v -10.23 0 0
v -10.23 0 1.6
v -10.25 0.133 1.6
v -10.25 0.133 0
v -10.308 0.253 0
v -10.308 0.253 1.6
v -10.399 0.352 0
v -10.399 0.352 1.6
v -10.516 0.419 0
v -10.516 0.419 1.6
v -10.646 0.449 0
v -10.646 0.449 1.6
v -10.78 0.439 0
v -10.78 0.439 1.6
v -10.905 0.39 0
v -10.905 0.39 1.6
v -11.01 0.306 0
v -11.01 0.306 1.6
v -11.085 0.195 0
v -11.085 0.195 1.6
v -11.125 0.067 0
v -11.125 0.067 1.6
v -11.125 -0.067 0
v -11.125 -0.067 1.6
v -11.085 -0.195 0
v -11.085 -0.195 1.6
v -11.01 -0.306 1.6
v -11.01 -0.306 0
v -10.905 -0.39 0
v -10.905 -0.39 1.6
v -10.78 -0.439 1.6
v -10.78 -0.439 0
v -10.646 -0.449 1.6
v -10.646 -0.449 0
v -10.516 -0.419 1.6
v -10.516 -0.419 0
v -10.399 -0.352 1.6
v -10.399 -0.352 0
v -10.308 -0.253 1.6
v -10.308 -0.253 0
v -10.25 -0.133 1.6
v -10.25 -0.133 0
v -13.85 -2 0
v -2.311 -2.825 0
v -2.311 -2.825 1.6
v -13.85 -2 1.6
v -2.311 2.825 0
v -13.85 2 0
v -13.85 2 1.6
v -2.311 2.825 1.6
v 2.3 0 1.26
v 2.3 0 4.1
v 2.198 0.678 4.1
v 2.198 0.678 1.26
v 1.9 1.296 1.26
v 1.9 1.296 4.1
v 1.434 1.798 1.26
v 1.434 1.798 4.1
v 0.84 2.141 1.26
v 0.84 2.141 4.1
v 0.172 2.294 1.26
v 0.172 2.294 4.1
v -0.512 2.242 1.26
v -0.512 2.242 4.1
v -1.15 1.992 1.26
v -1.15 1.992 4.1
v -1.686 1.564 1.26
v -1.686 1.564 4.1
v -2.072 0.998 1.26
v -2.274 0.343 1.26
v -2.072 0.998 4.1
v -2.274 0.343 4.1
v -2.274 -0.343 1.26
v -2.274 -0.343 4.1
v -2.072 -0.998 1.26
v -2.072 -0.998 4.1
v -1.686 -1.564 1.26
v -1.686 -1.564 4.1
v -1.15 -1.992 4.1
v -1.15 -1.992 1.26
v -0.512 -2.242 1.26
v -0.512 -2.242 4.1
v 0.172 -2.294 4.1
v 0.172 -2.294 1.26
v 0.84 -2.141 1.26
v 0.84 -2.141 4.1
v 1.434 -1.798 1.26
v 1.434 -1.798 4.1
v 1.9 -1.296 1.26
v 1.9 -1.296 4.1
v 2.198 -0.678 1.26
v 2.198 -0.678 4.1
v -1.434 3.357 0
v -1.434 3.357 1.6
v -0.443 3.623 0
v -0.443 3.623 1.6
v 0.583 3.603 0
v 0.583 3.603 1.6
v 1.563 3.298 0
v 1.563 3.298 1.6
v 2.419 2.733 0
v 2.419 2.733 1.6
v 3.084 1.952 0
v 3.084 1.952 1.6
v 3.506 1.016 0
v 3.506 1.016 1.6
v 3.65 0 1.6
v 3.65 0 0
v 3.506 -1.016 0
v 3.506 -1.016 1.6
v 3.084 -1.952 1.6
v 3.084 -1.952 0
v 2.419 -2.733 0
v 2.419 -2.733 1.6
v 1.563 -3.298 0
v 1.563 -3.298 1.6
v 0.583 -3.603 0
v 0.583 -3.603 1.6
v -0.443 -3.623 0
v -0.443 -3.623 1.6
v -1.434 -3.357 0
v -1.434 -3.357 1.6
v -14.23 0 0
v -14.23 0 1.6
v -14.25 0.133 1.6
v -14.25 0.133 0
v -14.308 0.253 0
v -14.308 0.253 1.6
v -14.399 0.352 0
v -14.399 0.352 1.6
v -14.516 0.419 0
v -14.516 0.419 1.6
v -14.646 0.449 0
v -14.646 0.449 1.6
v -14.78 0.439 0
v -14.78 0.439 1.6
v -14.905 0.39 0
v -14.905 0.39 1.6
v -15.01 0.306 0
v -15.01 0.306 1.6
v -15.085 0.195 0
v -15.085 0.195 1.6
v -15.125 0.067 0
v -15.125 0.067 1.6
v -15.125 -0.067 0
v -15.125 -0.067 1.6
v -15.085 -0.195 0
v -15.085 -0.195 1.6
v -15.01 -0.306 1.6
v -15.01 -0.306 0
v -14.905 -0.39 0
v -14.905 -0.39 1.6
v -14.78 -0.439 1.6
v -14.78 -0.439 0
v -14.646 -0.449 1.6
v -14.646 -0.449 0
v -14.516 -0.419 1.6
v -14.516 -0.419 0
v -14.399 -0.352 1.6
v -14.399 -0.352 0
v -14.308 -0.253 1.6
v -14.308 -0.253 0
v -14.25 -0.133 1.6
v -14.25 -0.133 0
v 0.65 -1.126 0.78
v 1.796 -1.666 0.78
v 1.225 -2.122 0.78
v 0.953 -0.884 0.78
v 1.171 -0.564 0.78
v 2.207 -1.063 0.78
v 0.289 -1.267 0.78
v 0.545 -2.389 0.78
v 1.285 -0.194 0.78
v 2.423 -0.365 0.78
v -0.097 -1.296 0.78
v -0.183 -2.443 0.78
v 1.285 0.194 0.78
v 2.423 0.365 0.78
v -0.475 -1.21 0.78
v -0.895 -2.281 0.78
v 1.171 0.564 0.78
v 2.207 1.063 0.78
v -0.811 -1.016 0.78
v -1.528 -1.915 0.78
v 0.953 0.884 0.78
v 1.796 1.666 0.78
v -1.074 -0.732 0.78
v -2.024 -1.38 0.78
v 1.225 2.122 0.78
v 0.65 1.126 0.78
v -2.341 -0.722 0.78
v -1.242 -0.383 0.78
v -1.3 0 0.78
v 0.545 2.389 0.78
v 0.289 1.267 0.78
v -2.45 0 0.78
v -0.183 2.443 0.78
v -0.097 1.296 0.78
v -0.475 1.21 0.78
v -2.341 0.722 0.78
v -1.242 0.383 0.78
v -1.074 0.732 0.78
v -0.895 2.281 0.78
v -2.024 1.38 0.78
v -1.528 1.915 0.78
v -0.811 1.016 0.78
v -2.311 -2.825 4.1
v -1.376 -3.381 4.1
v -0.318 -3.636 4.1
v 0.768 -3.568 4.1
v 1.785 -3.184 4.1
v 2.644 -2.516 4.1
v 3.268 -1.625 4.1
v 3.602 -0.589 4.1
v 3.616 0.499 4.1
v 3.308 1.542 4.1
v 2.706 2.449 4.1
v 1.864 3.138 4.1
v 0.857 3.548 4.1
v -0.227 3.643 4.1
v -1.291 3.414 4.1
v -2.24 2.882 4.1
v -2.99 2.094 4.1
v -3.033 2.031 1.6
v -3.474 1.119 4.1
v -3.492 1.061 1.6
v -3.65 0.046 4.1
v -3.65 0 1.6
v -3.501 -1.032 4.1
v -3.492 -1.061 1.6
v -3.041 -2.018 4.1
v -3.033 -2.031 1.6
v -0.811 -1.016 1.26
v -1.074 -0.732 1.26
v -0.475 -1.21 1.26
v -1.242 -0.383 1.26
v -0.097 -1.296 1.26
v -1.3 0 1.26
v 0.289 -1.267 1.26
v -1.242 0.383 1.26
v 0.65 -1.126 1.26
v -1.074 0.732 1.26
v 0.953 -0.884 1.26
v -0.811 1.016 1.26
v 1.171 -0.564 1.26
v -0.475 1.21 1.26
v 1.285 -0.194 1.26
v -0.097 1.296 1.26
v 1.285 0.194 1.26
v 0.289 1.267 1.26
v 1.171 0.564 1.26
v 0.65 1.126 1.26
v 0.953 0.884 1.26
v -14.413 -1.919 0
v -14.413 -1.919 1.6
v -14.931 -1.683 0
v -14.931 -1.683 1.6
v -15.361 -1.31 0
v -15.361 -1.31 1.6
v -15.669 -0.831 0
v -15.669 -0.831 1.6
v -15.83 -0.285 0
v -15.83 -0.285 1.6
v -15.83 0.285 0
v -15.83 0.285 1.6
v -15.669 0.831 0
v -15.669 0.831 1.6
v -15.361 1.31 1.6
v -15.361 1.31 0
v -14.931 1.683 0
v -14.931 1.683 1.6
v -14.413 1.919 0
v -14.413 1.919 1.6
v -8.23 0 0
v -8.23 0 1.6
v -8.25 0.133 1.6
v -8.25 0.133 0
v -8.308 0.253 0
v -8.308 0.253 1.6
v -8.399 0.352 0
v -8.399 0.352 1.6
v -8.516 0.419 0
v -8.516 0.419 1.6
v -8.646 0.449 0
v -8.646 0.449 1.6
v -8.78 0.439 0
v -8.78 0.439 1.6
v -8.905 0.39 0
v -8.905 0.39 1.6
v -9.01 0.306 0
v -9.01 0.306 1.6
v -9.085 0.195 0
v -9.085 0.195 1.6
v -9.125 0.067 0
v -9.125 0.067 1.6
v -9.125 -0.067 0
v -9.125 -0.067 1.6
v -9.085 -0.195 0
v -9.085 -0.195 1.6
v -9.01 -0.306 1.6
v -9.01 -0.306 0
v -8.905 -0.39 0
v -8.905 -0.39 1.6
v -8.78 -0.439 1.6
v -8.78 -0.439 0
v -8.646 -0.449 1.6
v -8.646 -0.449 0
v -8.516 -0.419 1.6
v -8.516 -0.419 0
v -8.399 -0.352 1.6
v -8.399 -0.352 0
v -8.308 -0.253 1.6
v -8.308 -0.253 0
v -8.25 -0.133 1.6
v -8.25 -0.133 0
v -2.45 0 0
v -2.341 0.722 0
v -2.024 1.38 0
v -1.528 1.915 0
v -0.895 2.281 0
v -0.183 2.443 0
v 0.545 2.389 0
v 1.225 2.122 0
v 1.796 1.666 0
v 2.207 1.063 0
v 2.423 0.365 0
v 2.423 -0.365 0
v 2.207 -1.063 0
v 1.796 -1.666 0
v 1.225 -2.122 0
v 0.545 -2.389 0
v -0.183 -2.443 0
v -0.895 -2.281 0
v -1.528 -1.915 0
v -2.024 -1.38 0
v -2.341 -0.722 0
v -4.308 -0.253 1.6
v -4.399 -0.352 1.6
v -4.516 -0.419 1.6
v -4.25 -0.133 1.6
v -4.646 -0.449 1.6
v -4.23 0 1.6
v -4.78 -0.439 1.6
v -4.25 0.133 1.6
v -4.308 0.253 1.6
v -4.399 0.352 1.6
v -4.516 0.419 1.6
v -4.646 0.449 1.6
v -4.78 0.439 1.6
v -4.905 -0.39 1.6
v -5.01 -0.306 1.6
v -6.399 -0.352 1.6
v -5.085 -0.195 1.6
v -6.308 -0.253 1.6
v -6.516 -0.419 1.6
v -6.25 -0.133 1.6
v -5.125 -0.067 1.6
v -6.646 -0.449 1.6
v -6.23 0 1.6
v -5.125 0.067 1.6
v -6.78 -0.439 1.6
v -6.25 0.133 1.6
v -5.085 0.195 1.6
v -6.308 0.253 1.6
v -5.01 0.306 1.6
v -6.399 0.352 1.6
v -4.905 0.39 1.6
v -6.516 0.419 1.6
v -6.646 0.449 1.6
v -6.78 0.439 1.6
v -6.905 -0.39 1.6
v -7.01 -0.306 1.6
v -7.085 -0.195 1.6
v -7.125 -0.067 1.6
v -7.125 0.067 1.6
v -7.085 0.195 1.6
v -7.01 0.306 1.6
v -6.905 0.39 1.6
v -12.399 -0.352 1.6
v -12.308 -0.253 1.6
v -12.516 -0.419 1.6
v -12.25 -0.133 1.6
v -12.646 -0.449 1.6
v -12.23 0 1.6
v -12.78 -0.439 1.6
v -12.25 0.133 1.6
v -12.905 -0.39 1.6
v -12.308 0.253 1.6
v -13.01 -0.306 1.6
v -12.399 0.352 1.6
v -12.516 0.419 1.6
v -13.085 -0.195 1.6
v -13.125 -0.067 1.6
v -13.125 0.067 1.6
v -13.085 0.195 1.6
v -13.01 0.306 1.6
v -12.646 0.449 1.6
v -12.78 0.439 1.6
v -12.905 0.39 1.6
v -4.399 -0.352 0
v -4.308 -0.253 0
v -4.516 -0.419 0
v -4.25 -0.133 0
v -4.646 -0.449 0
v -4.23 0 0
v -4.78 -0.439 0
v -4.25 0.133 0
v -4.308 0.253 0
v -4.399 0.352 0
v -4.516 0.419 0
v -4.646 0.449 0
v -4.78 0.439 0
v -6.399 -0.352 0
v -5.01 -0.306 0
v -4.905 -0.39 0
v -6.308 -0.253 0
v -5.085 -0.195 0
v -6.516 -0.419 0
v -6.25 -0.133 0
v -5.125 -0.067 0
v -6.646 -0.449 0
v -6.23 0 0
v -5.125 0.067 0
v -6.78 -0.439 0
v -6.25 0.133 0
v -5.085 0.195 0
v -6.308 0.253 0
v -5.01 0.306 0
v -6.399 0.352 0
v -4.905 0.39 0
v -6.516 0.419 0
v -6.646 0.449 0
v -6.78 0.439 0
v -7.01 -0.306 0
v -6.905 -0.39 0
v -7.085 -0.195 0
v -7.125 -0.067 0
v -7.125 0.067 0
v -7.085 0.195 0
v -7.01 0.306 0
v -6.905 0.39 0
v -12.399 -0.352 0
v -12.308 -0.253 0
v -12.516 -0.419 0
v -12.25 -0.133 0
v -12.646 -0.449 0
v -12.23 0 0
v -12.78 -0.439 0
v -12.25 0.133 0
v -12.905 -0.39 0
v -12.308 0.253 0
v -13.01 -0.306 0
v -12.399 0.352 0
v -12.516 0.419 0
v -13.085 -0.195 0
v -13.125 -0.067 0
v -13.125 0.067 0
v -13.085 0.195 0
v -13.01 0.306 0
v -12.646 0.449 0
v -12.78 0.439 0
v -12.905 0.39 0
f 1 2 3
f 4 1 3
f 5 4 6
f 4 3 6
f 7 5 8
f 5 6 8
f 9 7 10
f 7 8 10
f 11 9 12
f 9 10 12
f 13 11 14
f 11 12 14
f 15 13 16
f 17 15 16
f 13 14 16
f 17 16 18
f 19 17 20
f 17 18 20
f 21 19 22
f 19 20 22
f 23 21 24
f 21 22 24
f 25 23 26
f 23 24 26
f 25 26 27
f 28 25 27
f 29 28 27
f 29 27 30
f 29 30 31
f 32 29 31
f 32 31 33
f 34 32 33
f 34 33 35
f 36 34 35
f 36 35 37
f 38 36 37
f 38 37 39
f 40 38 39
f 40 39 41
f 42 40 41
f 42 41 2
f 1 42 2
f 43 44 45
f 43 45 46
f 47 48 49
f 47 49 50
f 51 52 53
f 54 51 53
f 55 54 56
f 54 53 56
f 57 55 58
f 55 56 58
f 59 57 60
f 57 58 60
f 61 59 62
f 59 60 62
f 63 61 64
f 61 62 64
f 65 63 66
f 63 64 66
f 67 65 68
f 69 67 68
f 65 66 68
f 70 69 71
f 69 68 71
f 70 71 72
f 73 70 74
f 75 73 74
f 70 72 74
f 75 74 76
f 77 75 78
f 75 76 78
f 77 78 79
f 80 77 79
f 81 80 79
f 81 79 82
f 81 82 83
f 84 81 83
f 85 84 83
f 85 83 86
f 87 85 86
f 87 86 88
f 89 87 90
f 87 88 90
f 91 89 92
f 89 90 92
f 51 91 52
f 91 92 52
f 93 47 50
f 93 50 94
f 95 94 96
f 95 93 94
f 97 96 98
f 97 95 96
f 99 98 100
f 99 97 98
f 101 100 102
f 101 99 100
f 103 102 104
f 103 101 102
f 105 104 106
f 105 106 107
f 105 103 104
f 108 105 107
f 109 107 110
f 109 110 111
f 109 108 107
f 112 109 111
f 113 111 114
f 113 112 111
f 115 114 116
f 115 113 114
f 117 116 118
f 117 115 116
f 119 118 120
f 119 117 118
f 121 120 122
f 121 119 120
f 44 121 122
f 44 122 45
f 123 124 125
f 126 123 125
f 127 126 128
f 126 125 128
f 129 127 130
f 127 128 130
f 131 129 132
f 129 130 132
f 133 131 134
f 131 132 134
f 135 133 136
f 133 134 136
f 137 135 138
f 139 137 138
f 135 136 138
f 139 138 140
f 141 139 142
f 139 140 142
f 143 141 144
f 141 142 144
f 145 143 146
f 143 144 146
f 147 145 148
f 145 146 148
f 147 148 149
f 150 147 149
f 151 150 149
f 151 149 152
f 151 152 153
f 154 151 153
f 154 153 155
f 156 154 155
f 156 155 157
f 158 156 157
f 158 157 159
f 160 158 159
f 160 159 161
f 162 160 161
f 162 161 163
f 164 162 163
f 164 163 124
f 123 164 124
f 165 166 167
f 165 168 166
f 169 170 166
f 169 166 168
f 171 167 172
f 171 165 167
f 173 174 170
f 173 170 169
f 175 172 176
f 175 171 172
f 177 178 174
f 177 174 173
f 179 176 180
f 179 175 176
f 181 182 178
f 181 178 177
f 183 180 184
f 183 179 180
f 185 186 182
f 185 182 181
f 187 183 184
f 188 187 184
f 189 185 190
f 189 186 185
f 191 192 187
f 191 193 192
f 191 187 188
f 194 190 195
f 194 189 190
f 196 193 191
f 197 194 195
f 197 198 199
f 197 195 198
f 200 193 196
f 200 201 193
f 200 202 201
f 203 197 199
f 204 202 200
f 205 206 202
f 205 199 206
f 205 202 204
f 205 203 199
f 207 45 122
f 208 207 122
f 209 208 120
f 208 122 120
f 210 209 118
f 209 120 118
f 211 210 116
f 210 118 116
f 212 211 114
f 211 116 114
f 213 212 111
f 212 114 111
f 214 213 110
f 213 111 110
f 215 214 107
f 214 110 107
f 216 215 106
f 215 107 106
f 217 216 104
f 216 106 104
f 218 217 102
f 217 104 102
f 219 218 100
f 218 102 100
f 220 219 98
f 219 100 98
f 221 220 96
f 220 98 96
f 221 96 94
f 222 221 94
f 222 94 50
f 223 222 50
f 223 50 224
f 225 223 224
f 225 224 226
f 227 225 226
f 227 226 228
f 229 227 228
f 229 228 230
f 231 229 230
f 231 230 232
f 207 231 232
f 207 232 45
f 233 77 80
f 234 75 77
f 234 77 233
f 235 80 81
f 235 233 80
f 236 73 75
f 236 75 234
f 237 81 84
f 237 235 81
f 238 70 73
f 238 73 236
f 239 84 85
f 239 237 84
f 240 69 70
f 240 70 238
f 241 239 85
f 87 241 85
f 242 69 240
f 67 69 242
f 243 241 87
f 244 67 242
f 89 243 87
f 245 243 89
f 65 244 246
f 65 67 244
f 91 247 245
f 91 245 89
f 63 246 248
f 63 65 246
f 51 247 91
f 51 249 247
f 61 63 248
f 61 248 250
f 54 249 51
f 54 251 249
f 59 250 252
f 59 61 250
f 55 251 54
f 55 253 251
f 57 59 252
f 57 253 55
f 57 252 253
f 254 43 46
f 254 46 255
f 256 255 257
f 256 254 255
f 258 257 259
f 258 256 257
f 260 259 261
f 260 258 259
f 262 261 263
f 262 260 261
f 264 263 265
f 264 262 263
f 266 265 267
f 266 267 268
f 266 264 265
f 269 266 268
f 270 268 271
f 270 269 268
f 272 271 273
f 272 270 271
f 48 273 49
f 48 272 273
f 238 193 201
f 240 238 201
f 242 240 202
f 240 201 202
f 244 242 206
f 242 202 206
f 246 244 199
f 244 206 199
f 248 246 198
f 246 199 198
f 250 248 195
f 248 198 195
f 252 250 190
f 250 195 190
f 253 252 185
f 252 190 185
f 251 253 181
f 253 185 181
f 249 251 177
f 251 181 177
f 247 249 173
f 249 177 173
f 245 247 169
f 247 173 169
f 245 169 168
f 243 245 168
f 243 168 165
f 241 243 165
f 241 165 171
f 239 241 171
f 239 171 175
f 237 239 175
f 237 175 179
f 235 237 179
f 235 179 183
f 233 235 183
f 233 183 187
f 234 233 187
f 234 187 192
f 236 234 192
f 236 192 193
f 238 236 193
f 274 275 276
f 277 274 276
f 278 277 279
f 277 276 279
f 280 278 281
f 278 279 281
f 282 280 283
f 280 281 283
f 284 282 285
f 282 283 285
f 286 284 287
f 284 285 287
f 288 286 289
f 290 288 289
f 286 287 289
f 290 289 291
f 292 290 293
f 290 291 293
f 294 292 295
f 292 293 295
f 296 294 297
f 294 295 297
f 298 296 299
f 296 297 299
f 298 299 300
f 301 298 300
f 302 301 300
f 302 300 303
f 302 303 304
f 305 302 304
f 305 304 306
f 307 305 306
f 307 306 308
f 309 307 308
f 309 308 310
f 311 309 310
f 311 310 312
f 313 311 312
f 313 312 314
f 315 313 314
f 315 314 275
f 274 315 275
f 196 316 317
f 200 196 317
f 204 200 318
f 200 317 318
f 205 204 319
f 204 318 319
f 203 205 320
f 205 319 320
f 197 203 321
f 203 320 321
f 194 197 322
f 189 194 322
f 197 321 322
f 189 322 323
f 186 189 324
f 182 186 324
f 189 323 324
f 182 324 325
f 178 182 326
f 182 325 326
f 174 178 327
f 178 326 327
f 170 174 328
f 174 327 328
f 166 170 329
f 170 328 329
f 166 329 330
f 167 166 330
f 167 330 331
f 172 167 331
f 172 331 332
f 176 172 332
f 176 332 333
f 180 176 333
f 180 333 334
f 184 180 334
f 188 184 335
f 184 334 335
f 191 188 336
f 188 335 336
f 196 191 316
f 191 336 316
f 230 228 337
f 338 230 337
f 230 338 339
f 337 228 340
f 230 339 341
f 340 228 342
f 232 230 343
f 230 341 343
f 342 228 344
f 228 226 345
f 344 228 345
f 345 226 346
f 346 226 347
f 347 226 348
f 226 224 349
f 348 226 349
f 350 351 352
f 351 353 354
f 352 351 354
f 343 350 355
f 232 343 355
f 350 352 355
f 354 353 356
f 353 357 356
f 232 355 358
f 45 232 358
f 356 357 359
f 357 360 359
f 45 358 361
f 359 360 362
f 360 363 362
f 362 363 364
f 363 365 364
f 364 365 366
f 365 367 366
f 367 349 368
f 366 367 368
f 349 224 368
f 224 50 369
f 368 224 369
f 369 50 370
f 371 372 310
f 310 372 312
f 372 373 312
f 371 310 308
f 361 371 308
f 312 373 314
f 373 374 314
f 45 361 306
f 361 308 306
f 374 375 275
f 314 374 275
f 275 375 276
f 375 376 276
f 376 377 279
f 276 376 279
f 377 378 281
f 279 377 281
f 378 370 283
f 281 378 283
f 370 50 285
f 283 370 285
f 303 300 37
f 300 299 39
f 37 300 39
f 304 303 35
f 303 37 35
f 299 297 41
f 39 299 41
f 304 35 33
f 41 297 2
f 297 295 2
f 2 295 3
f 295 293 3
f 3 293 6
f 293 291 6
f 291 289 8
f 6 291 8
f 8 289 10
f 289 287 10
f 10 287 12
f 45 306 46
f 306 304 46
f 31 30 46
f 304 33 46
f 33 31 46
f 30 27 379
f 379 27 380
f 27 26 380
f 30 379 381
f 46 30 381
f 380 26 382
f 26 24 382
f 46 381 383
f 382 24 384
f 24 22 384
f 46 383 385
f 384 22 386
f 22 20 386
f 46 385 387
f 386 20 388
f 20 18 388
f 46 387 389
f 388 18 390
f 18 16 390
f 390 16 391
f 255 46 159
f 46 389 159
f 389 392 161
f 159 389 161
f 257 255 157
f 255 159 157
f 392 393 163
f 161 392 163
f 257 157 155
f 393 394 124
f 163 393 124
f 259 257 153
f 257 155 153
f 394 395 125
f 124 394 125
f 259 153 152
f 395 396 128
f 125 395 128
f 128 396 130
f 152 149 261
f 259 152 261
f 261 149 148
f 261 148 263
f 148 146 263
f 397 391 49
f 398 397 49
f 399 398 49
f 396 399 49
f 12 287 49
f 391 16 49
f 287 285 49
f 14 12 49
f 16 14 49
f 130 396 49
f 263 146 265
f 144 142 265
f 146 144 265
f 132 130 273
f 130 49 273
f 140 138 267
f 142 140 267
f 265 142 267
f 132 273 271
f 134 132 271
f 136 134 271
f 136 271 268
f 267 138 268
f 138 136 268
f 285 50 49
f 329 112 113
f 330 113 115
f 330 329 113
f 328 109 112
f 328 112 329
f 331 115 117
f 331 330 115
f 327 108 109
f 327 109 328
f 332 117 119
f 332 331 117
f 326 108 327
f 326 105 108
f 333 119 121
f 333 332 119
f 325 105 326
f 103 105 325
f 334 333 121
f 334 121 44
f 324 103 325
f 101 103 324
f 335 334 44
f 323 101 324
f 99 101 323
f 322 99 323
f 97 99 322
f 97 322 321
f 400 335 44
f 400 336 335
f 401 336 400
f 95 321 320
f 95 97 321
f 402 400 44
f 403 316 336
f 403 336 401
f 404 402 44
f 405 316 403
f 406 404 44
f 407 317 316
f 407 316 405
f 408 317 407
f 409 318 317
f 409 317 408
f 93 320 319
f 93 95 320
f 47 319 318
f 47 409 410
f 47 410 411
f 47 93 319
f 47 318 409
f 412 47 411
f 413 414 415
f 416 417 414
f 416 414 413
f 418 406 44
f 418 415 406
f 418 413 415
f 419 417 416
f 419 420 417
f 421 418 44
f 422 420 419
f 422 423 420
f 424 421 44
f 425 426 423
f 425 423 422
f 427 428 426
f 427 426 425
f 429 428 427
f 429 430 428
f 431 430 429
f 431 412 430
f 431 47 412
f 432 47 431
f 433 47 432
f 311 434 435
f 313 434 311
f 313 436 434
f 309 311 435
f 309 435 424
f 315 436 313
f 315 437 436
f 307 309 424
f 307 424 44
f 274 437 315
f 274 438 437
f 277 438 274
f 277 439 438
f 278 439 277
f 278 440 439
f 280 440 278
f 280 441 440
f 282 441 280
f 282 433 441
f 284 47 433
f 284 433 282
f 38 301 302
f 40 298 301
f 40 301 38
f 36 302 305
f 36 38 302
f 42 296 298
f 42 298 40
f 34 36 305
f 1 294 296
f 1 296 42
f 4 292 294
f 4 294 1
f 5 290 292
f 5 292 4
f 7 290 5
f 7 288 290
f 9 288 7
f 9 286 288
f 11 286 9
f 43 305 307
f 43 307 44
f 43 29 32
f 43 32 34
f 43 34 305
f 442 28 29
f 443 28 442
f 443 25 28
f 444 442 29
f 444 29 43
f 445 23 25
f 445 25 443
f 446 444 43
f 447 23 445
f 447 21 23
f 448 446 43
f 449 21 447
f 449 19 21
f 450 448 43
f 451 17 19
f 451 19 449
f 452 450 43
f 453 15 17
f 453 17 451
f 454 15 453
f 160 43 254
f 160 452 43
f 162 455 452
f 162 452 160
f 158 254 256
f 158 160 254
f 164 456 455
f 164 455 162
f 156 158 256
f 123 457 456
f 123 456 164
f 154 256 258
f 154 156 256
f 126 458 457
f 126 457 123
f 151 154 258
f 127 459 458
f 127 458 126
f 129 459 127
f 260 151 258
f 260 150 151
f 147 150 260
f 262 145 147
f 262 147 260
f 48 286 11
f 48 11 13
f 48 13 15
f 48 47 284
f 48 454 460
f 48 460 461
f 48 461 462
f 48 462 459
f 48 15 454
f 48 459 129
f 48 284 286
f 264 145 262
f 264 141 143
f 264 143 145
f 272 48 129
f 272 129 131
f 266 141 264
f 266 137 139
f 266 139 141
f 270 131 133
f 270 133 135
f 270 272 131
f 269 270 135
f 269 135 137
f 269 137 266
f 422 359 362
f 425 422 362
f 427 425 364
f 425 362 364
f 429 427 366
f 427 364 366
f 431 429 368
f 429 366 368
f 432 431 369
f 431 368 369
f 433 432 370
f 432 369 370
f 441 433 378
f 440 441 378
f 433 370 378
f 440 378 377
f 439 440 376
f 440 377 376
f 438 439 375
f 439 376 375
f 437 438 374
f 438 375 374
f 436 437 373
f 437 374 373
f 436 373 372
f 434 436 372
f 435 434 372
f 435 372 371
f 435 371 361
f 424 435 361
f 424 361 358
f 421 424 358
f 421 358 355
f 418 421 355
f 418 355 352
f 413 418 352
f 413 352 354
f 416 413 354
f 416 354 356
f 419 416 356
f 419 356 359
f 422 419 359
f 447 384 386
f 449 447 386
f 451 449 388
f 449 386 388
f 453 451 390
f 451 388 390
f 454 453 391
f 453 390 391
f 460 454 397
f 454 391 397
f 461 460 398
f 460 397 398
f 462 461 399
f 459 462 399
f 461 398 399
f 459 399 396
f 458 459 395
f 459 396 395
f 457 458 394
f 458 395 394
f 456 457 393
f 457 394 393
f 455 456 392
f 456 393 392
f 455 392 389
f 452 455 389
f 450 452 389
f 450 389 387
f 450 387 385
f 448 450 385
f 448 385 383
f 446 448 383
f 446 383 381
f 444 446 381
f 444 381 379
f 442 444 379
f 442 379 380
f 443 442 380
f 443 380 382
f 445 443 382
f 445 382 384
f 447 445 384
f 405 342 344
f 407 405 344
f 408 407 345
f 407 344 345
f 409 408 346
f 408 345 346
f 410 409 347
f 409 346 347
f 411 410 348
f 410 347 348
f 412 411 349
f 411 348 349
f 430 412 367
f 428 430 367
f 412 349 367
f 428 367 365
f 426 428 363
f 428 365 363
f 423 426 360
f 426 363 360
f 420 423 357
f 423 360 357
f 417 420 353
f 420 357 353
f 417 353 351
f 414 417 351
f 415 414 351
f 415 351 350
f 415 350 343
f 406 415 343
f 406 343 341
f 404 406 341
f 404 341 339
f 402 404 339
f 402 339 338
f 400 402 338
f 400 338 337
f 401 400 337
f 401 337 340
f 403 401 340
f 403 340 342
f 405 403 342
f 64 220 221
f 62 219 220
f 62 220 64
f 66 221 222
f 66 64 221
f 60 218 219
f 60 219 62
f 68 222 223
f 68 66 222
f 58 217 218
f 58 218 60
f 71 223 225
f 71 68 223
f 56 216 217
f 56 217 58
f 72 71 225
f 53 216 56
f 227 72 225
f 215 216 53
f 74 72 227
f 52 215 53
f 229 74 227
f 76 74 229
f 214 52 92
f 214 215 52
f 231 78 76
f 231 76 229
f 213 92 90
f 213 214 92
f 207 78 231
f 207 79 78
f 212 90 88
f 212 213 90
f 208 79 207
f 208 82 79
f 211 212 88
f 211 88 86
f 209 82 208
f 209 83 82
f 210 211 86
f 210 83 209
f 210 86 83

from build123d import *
from build123d.topology import SkipClean

# Parameters (mm, degrees)
RESSALTO_EXTRUS_O1_DEPTH = 1.6
ESBO_O2_R                = 3.65
RESSALTO_EXTRUS_O2_DEPTH = 2.5
ESBO_O3_R                = 2.3
CORTE_EXTRUS_O1_DEPTH    = 2.84
CORTE_EXTRUS_O2_REACH    = 18.456
ESBO_O4_R                = 0.45
ESBO_O5_R                = 1.3
CORTE_EXTRUS_O3_DEPTH    = 2.84
ESBO_O6_R                = 2.45
CORTE_EXTRUS_O4_DEPTH    = 0.78


with BuildPart() as part:
    # Esboço1 → Ressalto-extrusão1 (new body)
    with BuildSketch(Plane.XY):
        with BuildLine():
            Line((-13.85, 2), (-2.311249662, 2.825))
            ThreePointArc((-2.311249662, 2.825), (3.65, 0), (-2.311249662, -2.825))
            Line((-2.311249662, -2.825), (-13.85, -2))
            ThreePointArc((-13.85, -2), (-15.85, 0), (-13.85, 2))
        make_face()
    extrude(amount=RESSALTO_EXTRUS_O1_DEPTH)

    # Esboço2 → Ressalto-extrusão2 (add)
    with SkipClean():  # the faces are left unmerged after this step: merging them gives an invalid solid
        with BuildSketch(Plane.XY.offset(1.6)):
            with Locations(Location((0, 0, 0), (0, 0, 230.711977832))):
                Circle(ESBO_O2_R)
        extrude(amount=RESSALTO_EXTRUS_O2_DEPTH)

    # Esboço3 → Corte-extrusão1 (cut)
    with SkipClean():  # the faces are left unmerged after this step: merging them gives an invalid solid
        with BuildSketch(Plane.XY.offset(4.1)):
            Circle(ESBO_O3_R)
        extrude(amount=-CORTE_EXTRUS_O1_DEPTH, mode=Mode.SUBTRACT)

    # Esboço4 → Corte-extrusão2 (cut, up to next)
    with BuildSketch(Plane.XY.offset(1.6), mode=Mode.PRIVATE) as corte_extrus_o2_sk1:
        with Locations((-4.68, 0)):
            Circle(ESBO_O4_R)
    corte_extrus_o2_tool1 = extrude(corte_extrus_o2_sk1.sketch, amount=-CORTE_EXTRUS_O2_REACH, mode=Mode.PRIVATE) & part.part
    # Esboço4 → Corte-extrusão2 (cut, up to next)
    with BuildSketch(Plane.XY.offset(1.6), mode=Mode.PRIVATE) as corte_extrus_o2_sk2:
        with Locations((-6.68, 0)):
            Circle(ESBO_O4_R)
    corte_extrus_o2_tool2 = extrude(corte_extrus_o2_sk2.sketch, amount=-CORTE_EXTRUS_O2_REACH, mode=Mode.PRIVATE) & part.part
    # Esboço4 → Corte-extrusão2 (cut, up to next)
    with BuildSketch(Plane.XY.offset(1.6), mode=Mode.PRIVATE) as corte_extrus_o2_sk3:
        with Locations((-8.68, 0)):
            Circle(ESBO_O4_R)
    corte_extrus_o2_tool3 = extrude(corte_extrus_o2_sk3.sketch, amount=-CORTE_EXTRUS_O2_REACH, mode=Mode.PRIVATE) & part.part
    # Esboço4 → Corte-extrusão2 (cut, up to next)
    with BuildSketch(Plane.XY.offset(1.6), mode=Mode.PRIVATE) as corte_extrus_o2_sk4:
        with Locations((-10.68, 0)):
            Circle(ESBO_O4_R)
    corte_extrus_o2_tool4 = extrude(corte_extrus_o2_sk4.sketch, amount=-CORTE_EXTRUS_O2_REACH, mode=Mode.PRIVATE) & part.part
    # Esboço4 → Corte-extrusão2 (cut, up to next)
    with BuildSketch(Plane.XY.offset(1.6), mode=Mode.PRIVATE) as corte_extrus_o2_sk5:
        with Locations((-12.68, 0)):
            Circle(ESBO_O4_R)
    corte_extrus_o2_tool5 = extrude(corte_extrus_o2_sk5.sketch, amount=-CORTE_EXTRUS_O2_REACH, mode=Mode.PRIVATE) & part.part
    # Esboço4 → Corte-extrusão2 (cut, up to next)
    with BuildSketch(Plane.XY.offset(1.6), mode=Mode.PRIVATE) as corte_extrus_o2_sk6:
        with Locations((-14.68, 0)):
            Circle(ESBO_O4_R)
    corte_extrus_o2_tool6 = extrude(corte_extrus_o2_sk6.sketch, amount=-CORTE_EXTRUS_O2_REACH, mode=Mode.PRIVATE) & part.part
    add(corte_extrus_o2_tool1.solids().sort_by_distance((-4.68, 0, 1.6))[0], mode=Mode.SUBTRACT)
    add(corte_extrus_o2_tool2.solids().sort_by_distance((-6.68, 0, 1.6))[0], mode=Mode.SUBTRACT)
    add(corte_extrus_o2_tool3.solids().sort_by_distance((-8.68, 0, 1.6))[0], mode=Mode.SUBTRACT)
    add(corte_extrus_o2_tool4.solids().sort_by_distance((-10.68, 0, 1.6))[0], mode=Mode.SUBTRACT)
    add(corte_extrus_o2_tool5.solids().sort_by_distance((-12.68, 0, 1.6))[0], mode=Mode.SUBTRACT)
    add(corte_extrus_o2_tool6.solids().sort_by_distance((-14.68, 0, 1.6))[0], mode=Mode.SUBTRACT)

    # Esboço5 → Corte-extrusão3 (cut)
    with SkipClean():  # the faces are left unmerged after this step: merging them gives an invalid solid
        with BuildSketch(Plane(origin=(0, 0, 0), x_dir=(-1, 0, 0), z_dir=(0, 0, -1))):
            Circle(ESBO_O5_R)
        extrude(amount=-CORTE_EXTRUS_O3_DEPTH, mode=Mode.SUBTRACT)

    # Esboço6 → Corte-extrusão4 (cut)
    with SkipClean():  # the faces are left unmerged after this step: merging them gives an invalid solid
        with BuildSketch(Plane(origin=(0, 0, 0), x_dir=(-1, 0, 0), z_dir=(0, 0, -1))):
            Circle(ESBO_O6_R)
        extrude(amount=-CORTE_EXTRUS_O4_DEPTH, mode=Mode.SUBTRACT)


solid = part.part
